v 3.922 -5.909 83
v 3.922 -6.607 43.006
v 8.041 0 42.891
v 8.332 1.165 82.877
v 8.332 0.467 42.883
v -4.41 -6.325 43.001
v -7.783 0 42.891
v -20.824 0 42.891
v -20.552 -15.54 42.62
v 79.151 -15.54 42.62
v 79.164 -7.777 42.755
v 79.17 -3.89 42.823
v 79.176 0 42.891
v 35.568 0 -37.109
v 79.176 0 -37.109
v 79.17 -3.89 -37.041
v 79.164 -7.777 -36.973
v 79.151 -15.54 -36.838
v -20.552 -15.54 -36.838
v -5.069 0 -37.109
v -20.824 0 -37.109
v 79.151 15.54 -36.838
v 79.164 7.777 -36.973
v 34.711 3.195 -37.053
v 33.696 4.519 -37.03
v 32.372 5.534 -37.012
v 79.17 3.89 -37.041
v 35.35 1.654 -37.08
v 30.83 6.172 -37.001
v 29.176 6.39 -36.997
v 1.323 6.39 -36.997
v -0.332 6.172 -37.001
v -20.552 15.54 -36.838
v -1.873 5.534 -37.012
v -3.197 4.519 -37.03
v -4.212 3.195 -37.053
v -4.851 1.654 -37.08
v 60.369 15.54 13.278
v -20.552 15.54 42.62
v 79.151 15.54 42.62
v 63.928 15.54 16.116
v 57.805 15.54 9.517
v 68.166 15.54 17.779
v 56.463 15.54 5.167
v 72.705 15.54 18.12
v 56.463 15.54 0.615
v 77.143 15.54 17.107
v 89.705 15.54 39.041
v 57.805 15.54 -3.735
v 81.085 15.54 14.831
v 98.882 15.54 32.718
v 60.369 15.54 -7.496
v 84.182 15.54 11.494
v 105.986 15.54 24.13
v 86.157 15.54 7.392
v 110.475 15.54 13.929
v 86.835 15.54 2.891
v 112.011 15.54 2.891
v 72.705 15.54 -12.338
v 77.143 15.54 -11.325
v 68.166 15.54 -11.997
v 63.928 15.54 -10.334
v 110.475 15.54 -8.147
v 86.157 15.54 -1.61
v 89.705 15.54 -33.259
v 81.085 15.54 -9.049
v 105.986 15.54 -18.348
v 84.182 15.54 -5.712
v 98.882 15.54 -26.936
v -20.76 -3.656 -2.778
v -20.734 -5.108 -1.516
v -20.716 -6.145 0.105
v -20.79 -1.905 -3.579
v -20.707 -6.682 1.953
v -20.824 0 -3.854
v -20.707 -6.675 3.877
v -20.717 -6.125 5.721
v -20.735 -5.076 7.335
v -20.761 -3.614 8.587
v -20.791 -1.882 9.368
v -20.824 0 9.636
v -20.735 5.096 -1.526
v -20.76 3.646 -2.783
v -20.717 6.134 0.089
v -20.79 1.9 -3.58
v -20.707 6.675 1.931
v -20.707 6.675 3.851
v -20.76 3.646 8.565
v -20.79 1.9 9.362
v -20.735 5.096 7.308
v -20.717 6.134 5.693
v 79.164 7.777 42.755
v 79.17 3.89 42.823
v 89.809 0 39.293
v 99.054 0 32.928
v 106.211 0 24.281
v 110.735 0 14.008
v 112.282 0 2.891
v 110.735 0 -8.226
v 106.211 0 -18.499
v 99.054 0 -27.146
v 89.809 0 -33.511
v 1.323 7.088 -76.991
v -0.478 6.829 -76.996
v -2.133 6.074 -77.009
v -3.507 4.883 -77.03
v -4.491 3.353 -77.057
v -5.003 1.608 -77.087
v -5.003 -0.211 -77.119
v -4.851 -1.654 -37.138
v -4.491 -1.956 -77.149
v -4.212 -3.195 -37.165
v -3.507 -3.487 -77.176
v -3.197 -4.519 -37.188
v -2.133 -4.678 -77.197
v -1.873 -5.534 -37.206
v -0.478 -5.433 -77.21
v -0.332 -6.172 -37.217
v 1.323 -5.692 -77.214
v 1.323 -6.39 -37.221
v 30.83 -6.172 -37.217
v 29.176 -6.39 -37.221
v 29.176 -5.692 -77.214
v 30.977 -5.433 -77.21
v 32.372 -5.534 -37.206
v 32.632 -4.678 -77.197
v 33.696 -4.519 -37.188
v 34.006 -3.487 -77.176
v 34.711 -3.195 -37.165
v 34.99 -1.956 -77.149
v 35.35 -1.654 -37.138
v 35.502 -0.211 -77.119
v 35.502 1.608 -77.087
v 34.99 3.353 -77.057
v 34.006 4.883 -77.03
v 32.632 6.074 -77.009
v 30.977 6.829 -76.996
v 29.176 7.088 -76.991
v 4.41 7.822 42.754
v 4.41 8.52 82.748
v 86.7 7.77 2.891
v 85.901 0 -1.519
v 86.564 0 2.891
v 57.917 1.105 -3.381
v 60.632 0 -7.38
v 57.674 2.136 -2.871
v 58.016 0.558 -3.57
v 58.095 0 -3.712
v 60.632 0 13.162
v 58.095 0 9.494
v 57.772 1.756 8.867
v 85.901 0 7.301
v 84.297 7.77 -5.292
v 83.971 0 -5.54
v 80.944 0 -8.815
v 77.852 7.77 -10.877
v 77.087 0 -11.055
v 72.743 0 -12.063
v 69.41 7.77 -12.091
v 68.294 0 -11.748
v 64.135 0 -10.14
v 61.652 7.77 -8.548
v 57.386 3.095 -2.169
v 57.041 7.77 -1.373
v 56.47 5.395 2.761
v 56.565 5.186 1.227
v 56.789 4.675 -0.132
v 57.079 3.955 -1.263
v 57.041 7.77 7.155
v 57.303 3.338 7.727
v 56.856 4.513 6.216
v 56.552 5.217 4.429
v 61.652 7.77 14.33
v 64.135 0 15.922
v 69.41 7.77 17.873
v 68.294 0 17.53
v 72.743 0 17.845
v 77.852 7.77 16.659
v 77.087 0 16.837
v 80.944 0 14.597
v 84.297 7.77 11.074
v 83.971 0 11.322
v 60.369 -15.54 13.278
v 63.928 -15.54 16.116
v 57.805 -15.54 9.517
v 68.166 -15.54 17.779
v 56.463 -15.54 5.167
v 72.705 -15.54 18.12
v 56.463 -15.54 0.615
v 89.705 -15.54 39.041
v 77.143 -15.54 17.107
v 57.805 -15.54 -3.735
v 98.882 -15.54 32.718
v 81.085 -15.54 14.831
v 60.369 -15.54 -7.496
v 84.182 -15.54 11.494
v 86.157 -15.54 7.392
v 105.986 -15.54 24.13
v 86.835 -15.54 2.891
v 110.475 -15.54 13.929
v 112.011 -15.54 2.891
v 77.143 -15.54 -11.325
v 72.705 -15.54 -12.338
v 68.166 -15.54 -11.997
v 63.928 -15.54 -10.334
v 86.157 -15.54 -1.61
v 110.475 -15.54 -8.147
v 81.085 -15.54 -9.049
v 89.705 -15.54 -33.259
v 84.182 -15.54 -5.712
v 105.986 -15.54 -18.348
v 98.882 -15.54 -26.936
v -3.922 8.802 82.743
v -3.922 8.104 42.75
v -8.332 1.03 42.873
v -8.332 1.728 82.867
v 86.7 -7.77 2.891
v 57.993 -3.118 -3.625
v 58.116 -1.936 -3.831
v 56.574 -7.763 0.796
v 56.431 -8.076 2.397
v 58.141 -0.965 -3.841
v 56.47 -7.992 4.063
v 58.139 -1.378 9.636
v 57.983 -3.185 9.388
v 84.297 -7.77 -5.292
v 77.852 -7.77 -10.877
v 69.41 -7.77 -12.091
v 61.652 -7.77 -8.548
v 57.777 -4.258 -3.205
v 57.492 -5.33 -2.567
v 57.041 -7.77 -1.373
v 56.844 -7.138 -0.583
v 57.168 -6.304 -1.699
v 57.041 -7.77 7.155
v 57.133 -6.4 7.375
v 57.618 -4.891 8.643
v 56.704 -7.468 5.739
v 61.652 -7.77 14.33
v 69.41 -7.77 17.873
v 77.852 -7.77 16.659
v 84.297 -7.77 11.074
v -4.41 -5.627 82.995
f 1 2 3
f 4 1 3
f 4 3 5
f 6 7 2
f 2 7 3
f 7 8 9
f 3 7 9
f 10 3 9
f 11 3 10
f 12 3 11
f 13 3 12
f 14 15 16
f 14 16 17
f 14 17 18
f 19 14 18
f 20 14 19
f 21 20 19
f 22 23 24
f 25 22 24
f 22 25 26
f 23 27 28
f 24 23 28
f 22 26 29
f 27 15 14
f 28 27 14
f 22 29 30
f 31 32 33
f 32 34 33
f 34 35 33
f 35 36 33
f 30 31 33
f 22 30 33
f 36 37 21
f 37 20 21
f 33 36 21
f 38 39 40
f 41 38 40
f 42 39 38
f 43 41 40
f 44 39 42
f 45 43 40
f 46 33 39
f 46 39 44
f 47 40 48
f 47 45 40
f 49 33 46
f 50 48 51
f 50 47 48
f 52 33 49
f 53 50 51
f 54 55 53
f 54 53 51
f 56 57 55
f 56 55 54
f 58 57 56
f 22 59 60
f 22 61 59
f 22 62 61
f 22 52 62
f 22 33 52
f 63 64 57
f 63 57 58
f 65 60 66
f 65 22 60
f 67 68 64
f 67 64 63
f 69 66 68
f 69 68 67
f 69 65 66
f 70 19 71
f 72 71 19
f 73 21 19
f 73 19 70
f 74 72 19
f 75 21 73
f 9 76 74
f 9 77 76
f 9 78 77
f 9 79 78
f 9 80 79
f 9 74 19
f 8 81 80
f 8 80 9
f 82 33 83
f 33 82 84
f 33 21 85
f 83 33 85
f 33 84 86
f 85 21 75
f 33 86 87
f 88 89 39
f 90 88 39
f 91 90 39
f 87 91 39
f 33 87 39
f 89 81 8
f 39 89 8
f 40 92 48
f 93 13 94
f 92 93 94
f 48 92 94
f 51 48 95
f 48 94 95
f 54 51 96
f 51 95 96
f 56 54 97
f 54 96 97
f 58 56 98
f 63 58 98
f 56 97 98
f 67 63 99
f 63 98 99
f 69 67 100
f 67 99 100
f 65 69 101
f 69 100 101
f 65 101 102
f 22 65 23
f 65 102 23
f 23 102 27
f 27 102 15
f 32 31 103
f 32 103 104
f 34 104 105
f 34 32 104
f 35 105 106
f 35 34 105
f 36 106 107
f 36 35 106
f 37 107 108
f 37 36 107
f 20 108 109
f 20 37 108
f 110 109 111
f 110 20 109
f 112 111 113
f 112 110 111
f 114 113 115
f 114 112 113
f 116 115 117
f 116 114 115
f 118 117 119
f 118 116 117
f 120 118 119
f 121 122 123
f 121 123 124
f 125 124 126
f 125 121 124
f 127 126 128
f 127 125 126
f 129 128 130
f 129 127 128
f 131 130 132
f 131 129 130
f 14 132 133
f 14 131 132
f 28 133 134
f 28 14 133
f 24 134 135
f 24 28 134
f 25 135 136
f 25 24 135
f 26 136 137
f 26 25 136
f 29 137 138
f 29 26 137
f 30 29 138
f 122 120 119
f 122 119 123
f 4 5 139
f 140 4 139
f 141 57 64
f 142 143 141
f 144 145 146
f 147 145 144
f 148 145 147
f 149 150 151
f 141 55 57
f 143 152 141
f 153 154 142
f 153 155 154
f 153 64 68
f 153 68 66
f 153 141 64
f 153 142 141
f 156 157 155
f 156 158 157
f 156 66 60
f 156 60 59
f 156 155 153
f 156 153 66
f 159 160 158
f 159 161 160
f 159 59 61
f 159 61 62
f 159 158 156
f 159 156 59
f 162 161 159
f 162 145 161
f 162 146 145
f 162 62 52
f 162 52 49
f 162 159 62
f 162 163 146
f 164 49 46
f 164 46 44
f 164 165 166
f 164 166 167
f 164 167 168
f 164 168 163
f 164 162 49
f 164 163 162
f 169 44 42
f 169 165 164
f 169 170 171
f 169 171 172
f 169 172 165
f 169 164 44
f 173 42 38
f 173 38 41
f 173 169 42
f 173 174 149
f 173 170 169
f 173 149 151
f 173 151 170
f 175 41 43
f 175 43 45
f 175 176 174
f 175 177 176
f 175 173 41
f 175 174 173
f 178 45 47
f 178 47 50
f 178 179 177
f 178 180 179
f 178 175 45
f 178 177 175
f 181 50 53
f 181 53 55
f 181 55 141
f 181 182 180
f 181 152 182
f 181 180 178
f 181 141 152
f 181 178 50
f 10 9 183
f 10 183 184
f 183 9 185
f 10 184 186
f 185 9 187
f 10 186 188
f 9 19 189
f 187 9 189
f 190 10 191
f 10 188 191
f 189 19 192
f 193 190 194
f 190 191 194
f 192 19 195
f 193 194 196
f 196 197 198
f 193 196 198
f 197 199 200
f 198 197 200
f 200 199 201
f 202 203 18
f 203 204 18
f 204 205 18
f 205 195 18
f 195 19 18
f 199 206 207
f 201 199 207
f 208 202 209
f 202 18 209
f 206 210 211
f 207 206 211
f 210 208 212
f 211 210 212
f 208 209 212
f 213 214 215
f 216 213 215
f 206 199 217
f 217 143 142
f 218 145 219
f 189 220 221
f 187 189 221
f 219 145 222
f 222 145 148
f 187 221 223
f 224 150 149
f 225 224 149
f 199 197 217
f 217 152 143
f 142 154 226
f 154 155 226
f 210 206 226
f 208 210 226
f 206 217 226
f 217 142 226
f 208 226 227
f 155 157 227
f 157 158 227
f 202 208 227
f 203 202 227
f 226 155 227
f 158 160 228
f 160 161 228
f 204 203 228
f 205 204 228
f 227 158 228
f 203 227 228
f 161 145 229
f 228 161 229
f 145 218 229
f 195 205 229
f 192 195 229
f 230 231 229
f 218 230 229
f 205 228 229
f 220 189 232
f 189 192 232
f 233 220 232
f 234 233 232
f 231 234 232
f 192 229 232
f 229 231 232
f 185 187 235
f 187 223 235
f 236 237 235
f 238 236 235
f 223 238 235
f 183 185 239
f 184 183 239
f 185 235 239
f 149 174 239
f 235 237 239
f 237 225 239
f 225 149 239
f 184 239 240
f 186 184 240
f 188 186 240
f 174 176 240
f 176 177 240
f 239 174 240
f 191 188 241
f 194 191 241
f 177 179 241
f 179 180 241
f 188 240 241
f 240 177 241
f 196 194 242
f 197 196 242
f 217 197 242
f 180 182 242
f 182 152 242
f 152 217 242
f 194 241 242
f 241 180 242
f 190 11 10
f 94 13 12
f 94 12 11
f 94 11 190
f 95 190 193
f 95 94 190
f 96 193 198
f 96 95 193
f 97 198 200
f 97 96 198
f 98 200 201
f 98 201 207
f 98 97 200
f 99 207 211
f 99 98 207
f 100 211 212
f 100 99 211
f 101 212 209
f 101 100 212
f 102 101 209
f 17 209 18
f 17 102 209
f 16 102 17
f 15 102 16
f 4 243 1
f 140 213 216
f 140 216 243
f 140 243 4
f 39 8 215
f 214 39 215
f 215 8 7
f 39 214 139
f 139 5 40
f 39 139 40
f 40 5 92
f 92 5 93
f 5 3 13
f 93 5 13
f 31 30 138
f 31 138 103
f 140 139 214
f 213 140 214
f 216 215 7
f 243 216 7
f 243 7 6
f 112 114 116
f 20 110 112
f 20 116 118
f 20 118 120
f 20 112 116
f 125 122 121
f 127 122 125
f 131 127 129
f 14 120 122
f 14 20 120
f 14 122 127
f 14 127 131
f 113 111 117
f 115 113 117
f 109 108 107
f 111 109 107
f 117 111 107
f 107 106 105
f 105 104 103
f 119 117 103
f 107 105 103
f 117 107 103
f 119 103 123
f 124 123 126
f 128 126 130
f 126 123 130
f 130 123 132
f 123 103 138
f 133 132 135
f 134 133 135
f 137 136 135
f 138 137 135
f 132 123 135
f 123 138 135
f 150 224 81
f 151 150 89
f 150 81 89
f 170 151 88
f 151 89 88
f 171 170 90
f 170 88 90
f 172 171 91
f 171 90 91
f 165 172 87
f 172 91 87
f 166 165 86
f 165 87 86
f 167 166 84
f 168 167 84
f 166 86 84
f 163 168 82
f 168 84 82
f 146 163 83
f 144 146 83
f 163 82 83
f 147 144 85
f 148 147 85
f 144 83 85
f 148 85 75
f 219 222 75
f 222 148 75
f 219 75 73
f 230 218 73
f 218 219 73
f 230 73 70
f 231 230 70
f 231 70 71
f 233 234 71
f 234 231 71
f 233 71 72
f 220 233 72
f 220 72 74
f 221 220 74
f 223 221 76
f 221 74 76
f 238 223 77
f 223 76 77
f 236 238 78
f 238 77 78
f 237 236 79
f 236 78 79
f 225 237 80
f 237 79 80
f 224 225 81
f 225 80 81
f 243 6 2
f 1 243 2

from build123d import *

# Parameters (mm, degrees)
SKETCH1_R                     = 15
BOSS_EXTRUDE1_DEPTH           = 15.54000612
BOSS_EXTRUDE1_DRAFT           = 1
BOSS_EXTRUDE1_OTHER_WAY_DEPTH = 15.54000612
BOSS_EXTRUDE1_OTHER_WAY_DRAFT = -1
SKETCH4_R                     = 6.744646555
CUT_EXTRUDE3_DEPTH            = 93.319796338
BOSS_EXTRUDE4_DEPTH           = 40
BOSS_EXTRUDE5_DEPTH           = 40


with BuildPart() as part:
    # Sketch1 → Boss-Extrude1 (with draft: the straight prism first)
    with BuildSketch(Plane(origin=(0, 0, 0), x_dir=(1, 0, 0), z_dir=(0, 1, 0))):
        with BuildLine():
            Line((-20.823660635, 37.109004739), (-20.823660635, -42.890995261))
            Line((-20.823660635, -42.890995261), (79.176339365, -42.890995261))
            ThreePointArc((79.176339365, -42.890995261), (112.281888642, -2.890995261), (79.176339365, 37.109004739))
            Line((79.176339365, 37.109004739), (-20.823660635, 37.109004739))
        make_face()
        with Locations((71.563981043, -2.890995261)):
            Circle(SKETCH1_R, mode=Mode.SUBTRACT)
    extrude(amount=BOSS_EXTRUDE1_DEPTH)
    # Boss-Extrude1: the draft: its side faces are tilted about the plane it starts from
    boss_extrude1_sides = [part.faces().sort_by_distance(p)[0] for p in [
        (29.176339365, 7.77000306, -37.109004739),
        (-20.823660635, 7.77000306, 2.890995261),
        (29.176339365, 7.77000306, 42.890995261),
        (112.281888642, 7.77000306, 2.890995261),
        (56.563981043, 7.77000306, 2.890995261),
    ]]
    draft(boss_extrude1_sides, Plane(origin=(0, 0, 0), x_dir=(1, 0, 0), z_dir=(0, 1, 0)), BOSS_EXTRUDE1_DRAFT)


with BuildPart() as boss_extrude1_other_way_tool:
    # Sketch1 → Boss-Extrude1 other way (with draft: the straight prism first)
    with BuildSketch(Plane(origin=(0, 0, 0), x_dir=(1, 0, 0), z_dir=(0, 1, 0))):
        with BuildLine():
            Line((-20.823660635, 37.109004739), (-20.823660635, -42.890995261))
            Line((-20.823660635, -42.890995261), (79.176339365, -42.890995261))
            ThreePointArc((79.176339365, -42.890995261), (112.281888642, -2.890995261), (79.176339365, 37.109004739))
            Line((79.176339365, 37.109004739), (-20.823660635, 37.109004739))
        make_face()
        with Locations((71.563981043, -2.890995261)):
            Circle(SKETCH1_R, mode=Mode.SUBTRACT)
    extrude(amount=-BOSS_EXTRUDE1_OTHER_WAY_DEPTH)
    # Boss-Extrude1 other way: the draft: its side faces are tilted about the plane it starts from
    boss_extrude1_other_way_sides = [boss_extrude1_other_way_tool.faces().sort_by_distance(p)[0] for p in [
        (29.176339365, -7.77000306, -37.109004739),
        (-20.823660635, -7.77000306, 2.890995261),
        (29.176339365, -7.77000306, 42.890995261),
        (112.281888642, -7.77000306, 2.890995261),
        (56.563981043, -7.77000306, 2.890995261),
    ]]
    draft(boss_extrude1_other_way_sides, Plane(origin=(0, 0, 0), x_dir=(1, 0, 0), z_dir=(0, 1, 0)), BOSS_EXTRUDE1_OTHER_WAY_DRAFT)


with BuildPart() as part_1:
    add(part.part)

    # Boss-Extrude1 other way: add boss_extrude1_other_way_tool
    add(boss_extrude1_other_way_tool.part)

    # Sketch4 → Cut-Extrude3 (cut)
    with BuildSketch(Plane(origin=(-20.817318029, 0.363367638, 0), x_dir=(0, 0, 1), z_dir=(-0.9998476951563913, 0.01745240643728355, 0))):
        with Locations((2.890995261, -0.363422989)):
            Circle(SKETCH4_R)
    extrude(amount=-CUT_EXTRUDE3_DEPTH, mode=Mode.SUBTRACT)

    # Sketch5 → Boss-Extrude4 (add)
    with BuildSketch(Plane(origin=(0, 0.647542794, -37.097701838), x_dir=(-1, 0, 0), z_dir=(0, 0.01745240643728355, -0.9998476951563913))):
        with BuildLine():
            Line((-29.176339365, 5.74353059), (-1.322649043, 5.74353059))
            ThreePointArc((-1.322649043, 5.74353059), (5.06852298, -0.647641433), (-1.322649043, -7.038813456))
            Line((-1.322649043, -7.038813456), (-29.176339365, -7.038813456))
            ThreePointArc((-29.176339365, -7.038813456), (-35.567511388, -0.647641433), (-29.176339365, 5.74353059))
        make_face()
    extrude(amount=BOSS_EXTRUDE4_DEPTH)

    # Sketch6 → Boss-Extrude5 (add)
    with BuildSketch(Plane(origin=(0, 0.748437074, 42.877931243), x_dir=(1, 0, 0), z_dir=(0, 0.017452406437283557, 0.9998476951563913))):
        Polygon((3.92205187, -7.356373004), (8.331831836, -0.281589948), (4.409779966, 7.074783056), (-3.92205187, 7.356373004), (-8.331831836, 0.281589948), (-4.409779966, -7.074783056), align=None)
    extrude(amount=BOSS_EXTRUDE5_DEPTH)


solid = part_1.part
